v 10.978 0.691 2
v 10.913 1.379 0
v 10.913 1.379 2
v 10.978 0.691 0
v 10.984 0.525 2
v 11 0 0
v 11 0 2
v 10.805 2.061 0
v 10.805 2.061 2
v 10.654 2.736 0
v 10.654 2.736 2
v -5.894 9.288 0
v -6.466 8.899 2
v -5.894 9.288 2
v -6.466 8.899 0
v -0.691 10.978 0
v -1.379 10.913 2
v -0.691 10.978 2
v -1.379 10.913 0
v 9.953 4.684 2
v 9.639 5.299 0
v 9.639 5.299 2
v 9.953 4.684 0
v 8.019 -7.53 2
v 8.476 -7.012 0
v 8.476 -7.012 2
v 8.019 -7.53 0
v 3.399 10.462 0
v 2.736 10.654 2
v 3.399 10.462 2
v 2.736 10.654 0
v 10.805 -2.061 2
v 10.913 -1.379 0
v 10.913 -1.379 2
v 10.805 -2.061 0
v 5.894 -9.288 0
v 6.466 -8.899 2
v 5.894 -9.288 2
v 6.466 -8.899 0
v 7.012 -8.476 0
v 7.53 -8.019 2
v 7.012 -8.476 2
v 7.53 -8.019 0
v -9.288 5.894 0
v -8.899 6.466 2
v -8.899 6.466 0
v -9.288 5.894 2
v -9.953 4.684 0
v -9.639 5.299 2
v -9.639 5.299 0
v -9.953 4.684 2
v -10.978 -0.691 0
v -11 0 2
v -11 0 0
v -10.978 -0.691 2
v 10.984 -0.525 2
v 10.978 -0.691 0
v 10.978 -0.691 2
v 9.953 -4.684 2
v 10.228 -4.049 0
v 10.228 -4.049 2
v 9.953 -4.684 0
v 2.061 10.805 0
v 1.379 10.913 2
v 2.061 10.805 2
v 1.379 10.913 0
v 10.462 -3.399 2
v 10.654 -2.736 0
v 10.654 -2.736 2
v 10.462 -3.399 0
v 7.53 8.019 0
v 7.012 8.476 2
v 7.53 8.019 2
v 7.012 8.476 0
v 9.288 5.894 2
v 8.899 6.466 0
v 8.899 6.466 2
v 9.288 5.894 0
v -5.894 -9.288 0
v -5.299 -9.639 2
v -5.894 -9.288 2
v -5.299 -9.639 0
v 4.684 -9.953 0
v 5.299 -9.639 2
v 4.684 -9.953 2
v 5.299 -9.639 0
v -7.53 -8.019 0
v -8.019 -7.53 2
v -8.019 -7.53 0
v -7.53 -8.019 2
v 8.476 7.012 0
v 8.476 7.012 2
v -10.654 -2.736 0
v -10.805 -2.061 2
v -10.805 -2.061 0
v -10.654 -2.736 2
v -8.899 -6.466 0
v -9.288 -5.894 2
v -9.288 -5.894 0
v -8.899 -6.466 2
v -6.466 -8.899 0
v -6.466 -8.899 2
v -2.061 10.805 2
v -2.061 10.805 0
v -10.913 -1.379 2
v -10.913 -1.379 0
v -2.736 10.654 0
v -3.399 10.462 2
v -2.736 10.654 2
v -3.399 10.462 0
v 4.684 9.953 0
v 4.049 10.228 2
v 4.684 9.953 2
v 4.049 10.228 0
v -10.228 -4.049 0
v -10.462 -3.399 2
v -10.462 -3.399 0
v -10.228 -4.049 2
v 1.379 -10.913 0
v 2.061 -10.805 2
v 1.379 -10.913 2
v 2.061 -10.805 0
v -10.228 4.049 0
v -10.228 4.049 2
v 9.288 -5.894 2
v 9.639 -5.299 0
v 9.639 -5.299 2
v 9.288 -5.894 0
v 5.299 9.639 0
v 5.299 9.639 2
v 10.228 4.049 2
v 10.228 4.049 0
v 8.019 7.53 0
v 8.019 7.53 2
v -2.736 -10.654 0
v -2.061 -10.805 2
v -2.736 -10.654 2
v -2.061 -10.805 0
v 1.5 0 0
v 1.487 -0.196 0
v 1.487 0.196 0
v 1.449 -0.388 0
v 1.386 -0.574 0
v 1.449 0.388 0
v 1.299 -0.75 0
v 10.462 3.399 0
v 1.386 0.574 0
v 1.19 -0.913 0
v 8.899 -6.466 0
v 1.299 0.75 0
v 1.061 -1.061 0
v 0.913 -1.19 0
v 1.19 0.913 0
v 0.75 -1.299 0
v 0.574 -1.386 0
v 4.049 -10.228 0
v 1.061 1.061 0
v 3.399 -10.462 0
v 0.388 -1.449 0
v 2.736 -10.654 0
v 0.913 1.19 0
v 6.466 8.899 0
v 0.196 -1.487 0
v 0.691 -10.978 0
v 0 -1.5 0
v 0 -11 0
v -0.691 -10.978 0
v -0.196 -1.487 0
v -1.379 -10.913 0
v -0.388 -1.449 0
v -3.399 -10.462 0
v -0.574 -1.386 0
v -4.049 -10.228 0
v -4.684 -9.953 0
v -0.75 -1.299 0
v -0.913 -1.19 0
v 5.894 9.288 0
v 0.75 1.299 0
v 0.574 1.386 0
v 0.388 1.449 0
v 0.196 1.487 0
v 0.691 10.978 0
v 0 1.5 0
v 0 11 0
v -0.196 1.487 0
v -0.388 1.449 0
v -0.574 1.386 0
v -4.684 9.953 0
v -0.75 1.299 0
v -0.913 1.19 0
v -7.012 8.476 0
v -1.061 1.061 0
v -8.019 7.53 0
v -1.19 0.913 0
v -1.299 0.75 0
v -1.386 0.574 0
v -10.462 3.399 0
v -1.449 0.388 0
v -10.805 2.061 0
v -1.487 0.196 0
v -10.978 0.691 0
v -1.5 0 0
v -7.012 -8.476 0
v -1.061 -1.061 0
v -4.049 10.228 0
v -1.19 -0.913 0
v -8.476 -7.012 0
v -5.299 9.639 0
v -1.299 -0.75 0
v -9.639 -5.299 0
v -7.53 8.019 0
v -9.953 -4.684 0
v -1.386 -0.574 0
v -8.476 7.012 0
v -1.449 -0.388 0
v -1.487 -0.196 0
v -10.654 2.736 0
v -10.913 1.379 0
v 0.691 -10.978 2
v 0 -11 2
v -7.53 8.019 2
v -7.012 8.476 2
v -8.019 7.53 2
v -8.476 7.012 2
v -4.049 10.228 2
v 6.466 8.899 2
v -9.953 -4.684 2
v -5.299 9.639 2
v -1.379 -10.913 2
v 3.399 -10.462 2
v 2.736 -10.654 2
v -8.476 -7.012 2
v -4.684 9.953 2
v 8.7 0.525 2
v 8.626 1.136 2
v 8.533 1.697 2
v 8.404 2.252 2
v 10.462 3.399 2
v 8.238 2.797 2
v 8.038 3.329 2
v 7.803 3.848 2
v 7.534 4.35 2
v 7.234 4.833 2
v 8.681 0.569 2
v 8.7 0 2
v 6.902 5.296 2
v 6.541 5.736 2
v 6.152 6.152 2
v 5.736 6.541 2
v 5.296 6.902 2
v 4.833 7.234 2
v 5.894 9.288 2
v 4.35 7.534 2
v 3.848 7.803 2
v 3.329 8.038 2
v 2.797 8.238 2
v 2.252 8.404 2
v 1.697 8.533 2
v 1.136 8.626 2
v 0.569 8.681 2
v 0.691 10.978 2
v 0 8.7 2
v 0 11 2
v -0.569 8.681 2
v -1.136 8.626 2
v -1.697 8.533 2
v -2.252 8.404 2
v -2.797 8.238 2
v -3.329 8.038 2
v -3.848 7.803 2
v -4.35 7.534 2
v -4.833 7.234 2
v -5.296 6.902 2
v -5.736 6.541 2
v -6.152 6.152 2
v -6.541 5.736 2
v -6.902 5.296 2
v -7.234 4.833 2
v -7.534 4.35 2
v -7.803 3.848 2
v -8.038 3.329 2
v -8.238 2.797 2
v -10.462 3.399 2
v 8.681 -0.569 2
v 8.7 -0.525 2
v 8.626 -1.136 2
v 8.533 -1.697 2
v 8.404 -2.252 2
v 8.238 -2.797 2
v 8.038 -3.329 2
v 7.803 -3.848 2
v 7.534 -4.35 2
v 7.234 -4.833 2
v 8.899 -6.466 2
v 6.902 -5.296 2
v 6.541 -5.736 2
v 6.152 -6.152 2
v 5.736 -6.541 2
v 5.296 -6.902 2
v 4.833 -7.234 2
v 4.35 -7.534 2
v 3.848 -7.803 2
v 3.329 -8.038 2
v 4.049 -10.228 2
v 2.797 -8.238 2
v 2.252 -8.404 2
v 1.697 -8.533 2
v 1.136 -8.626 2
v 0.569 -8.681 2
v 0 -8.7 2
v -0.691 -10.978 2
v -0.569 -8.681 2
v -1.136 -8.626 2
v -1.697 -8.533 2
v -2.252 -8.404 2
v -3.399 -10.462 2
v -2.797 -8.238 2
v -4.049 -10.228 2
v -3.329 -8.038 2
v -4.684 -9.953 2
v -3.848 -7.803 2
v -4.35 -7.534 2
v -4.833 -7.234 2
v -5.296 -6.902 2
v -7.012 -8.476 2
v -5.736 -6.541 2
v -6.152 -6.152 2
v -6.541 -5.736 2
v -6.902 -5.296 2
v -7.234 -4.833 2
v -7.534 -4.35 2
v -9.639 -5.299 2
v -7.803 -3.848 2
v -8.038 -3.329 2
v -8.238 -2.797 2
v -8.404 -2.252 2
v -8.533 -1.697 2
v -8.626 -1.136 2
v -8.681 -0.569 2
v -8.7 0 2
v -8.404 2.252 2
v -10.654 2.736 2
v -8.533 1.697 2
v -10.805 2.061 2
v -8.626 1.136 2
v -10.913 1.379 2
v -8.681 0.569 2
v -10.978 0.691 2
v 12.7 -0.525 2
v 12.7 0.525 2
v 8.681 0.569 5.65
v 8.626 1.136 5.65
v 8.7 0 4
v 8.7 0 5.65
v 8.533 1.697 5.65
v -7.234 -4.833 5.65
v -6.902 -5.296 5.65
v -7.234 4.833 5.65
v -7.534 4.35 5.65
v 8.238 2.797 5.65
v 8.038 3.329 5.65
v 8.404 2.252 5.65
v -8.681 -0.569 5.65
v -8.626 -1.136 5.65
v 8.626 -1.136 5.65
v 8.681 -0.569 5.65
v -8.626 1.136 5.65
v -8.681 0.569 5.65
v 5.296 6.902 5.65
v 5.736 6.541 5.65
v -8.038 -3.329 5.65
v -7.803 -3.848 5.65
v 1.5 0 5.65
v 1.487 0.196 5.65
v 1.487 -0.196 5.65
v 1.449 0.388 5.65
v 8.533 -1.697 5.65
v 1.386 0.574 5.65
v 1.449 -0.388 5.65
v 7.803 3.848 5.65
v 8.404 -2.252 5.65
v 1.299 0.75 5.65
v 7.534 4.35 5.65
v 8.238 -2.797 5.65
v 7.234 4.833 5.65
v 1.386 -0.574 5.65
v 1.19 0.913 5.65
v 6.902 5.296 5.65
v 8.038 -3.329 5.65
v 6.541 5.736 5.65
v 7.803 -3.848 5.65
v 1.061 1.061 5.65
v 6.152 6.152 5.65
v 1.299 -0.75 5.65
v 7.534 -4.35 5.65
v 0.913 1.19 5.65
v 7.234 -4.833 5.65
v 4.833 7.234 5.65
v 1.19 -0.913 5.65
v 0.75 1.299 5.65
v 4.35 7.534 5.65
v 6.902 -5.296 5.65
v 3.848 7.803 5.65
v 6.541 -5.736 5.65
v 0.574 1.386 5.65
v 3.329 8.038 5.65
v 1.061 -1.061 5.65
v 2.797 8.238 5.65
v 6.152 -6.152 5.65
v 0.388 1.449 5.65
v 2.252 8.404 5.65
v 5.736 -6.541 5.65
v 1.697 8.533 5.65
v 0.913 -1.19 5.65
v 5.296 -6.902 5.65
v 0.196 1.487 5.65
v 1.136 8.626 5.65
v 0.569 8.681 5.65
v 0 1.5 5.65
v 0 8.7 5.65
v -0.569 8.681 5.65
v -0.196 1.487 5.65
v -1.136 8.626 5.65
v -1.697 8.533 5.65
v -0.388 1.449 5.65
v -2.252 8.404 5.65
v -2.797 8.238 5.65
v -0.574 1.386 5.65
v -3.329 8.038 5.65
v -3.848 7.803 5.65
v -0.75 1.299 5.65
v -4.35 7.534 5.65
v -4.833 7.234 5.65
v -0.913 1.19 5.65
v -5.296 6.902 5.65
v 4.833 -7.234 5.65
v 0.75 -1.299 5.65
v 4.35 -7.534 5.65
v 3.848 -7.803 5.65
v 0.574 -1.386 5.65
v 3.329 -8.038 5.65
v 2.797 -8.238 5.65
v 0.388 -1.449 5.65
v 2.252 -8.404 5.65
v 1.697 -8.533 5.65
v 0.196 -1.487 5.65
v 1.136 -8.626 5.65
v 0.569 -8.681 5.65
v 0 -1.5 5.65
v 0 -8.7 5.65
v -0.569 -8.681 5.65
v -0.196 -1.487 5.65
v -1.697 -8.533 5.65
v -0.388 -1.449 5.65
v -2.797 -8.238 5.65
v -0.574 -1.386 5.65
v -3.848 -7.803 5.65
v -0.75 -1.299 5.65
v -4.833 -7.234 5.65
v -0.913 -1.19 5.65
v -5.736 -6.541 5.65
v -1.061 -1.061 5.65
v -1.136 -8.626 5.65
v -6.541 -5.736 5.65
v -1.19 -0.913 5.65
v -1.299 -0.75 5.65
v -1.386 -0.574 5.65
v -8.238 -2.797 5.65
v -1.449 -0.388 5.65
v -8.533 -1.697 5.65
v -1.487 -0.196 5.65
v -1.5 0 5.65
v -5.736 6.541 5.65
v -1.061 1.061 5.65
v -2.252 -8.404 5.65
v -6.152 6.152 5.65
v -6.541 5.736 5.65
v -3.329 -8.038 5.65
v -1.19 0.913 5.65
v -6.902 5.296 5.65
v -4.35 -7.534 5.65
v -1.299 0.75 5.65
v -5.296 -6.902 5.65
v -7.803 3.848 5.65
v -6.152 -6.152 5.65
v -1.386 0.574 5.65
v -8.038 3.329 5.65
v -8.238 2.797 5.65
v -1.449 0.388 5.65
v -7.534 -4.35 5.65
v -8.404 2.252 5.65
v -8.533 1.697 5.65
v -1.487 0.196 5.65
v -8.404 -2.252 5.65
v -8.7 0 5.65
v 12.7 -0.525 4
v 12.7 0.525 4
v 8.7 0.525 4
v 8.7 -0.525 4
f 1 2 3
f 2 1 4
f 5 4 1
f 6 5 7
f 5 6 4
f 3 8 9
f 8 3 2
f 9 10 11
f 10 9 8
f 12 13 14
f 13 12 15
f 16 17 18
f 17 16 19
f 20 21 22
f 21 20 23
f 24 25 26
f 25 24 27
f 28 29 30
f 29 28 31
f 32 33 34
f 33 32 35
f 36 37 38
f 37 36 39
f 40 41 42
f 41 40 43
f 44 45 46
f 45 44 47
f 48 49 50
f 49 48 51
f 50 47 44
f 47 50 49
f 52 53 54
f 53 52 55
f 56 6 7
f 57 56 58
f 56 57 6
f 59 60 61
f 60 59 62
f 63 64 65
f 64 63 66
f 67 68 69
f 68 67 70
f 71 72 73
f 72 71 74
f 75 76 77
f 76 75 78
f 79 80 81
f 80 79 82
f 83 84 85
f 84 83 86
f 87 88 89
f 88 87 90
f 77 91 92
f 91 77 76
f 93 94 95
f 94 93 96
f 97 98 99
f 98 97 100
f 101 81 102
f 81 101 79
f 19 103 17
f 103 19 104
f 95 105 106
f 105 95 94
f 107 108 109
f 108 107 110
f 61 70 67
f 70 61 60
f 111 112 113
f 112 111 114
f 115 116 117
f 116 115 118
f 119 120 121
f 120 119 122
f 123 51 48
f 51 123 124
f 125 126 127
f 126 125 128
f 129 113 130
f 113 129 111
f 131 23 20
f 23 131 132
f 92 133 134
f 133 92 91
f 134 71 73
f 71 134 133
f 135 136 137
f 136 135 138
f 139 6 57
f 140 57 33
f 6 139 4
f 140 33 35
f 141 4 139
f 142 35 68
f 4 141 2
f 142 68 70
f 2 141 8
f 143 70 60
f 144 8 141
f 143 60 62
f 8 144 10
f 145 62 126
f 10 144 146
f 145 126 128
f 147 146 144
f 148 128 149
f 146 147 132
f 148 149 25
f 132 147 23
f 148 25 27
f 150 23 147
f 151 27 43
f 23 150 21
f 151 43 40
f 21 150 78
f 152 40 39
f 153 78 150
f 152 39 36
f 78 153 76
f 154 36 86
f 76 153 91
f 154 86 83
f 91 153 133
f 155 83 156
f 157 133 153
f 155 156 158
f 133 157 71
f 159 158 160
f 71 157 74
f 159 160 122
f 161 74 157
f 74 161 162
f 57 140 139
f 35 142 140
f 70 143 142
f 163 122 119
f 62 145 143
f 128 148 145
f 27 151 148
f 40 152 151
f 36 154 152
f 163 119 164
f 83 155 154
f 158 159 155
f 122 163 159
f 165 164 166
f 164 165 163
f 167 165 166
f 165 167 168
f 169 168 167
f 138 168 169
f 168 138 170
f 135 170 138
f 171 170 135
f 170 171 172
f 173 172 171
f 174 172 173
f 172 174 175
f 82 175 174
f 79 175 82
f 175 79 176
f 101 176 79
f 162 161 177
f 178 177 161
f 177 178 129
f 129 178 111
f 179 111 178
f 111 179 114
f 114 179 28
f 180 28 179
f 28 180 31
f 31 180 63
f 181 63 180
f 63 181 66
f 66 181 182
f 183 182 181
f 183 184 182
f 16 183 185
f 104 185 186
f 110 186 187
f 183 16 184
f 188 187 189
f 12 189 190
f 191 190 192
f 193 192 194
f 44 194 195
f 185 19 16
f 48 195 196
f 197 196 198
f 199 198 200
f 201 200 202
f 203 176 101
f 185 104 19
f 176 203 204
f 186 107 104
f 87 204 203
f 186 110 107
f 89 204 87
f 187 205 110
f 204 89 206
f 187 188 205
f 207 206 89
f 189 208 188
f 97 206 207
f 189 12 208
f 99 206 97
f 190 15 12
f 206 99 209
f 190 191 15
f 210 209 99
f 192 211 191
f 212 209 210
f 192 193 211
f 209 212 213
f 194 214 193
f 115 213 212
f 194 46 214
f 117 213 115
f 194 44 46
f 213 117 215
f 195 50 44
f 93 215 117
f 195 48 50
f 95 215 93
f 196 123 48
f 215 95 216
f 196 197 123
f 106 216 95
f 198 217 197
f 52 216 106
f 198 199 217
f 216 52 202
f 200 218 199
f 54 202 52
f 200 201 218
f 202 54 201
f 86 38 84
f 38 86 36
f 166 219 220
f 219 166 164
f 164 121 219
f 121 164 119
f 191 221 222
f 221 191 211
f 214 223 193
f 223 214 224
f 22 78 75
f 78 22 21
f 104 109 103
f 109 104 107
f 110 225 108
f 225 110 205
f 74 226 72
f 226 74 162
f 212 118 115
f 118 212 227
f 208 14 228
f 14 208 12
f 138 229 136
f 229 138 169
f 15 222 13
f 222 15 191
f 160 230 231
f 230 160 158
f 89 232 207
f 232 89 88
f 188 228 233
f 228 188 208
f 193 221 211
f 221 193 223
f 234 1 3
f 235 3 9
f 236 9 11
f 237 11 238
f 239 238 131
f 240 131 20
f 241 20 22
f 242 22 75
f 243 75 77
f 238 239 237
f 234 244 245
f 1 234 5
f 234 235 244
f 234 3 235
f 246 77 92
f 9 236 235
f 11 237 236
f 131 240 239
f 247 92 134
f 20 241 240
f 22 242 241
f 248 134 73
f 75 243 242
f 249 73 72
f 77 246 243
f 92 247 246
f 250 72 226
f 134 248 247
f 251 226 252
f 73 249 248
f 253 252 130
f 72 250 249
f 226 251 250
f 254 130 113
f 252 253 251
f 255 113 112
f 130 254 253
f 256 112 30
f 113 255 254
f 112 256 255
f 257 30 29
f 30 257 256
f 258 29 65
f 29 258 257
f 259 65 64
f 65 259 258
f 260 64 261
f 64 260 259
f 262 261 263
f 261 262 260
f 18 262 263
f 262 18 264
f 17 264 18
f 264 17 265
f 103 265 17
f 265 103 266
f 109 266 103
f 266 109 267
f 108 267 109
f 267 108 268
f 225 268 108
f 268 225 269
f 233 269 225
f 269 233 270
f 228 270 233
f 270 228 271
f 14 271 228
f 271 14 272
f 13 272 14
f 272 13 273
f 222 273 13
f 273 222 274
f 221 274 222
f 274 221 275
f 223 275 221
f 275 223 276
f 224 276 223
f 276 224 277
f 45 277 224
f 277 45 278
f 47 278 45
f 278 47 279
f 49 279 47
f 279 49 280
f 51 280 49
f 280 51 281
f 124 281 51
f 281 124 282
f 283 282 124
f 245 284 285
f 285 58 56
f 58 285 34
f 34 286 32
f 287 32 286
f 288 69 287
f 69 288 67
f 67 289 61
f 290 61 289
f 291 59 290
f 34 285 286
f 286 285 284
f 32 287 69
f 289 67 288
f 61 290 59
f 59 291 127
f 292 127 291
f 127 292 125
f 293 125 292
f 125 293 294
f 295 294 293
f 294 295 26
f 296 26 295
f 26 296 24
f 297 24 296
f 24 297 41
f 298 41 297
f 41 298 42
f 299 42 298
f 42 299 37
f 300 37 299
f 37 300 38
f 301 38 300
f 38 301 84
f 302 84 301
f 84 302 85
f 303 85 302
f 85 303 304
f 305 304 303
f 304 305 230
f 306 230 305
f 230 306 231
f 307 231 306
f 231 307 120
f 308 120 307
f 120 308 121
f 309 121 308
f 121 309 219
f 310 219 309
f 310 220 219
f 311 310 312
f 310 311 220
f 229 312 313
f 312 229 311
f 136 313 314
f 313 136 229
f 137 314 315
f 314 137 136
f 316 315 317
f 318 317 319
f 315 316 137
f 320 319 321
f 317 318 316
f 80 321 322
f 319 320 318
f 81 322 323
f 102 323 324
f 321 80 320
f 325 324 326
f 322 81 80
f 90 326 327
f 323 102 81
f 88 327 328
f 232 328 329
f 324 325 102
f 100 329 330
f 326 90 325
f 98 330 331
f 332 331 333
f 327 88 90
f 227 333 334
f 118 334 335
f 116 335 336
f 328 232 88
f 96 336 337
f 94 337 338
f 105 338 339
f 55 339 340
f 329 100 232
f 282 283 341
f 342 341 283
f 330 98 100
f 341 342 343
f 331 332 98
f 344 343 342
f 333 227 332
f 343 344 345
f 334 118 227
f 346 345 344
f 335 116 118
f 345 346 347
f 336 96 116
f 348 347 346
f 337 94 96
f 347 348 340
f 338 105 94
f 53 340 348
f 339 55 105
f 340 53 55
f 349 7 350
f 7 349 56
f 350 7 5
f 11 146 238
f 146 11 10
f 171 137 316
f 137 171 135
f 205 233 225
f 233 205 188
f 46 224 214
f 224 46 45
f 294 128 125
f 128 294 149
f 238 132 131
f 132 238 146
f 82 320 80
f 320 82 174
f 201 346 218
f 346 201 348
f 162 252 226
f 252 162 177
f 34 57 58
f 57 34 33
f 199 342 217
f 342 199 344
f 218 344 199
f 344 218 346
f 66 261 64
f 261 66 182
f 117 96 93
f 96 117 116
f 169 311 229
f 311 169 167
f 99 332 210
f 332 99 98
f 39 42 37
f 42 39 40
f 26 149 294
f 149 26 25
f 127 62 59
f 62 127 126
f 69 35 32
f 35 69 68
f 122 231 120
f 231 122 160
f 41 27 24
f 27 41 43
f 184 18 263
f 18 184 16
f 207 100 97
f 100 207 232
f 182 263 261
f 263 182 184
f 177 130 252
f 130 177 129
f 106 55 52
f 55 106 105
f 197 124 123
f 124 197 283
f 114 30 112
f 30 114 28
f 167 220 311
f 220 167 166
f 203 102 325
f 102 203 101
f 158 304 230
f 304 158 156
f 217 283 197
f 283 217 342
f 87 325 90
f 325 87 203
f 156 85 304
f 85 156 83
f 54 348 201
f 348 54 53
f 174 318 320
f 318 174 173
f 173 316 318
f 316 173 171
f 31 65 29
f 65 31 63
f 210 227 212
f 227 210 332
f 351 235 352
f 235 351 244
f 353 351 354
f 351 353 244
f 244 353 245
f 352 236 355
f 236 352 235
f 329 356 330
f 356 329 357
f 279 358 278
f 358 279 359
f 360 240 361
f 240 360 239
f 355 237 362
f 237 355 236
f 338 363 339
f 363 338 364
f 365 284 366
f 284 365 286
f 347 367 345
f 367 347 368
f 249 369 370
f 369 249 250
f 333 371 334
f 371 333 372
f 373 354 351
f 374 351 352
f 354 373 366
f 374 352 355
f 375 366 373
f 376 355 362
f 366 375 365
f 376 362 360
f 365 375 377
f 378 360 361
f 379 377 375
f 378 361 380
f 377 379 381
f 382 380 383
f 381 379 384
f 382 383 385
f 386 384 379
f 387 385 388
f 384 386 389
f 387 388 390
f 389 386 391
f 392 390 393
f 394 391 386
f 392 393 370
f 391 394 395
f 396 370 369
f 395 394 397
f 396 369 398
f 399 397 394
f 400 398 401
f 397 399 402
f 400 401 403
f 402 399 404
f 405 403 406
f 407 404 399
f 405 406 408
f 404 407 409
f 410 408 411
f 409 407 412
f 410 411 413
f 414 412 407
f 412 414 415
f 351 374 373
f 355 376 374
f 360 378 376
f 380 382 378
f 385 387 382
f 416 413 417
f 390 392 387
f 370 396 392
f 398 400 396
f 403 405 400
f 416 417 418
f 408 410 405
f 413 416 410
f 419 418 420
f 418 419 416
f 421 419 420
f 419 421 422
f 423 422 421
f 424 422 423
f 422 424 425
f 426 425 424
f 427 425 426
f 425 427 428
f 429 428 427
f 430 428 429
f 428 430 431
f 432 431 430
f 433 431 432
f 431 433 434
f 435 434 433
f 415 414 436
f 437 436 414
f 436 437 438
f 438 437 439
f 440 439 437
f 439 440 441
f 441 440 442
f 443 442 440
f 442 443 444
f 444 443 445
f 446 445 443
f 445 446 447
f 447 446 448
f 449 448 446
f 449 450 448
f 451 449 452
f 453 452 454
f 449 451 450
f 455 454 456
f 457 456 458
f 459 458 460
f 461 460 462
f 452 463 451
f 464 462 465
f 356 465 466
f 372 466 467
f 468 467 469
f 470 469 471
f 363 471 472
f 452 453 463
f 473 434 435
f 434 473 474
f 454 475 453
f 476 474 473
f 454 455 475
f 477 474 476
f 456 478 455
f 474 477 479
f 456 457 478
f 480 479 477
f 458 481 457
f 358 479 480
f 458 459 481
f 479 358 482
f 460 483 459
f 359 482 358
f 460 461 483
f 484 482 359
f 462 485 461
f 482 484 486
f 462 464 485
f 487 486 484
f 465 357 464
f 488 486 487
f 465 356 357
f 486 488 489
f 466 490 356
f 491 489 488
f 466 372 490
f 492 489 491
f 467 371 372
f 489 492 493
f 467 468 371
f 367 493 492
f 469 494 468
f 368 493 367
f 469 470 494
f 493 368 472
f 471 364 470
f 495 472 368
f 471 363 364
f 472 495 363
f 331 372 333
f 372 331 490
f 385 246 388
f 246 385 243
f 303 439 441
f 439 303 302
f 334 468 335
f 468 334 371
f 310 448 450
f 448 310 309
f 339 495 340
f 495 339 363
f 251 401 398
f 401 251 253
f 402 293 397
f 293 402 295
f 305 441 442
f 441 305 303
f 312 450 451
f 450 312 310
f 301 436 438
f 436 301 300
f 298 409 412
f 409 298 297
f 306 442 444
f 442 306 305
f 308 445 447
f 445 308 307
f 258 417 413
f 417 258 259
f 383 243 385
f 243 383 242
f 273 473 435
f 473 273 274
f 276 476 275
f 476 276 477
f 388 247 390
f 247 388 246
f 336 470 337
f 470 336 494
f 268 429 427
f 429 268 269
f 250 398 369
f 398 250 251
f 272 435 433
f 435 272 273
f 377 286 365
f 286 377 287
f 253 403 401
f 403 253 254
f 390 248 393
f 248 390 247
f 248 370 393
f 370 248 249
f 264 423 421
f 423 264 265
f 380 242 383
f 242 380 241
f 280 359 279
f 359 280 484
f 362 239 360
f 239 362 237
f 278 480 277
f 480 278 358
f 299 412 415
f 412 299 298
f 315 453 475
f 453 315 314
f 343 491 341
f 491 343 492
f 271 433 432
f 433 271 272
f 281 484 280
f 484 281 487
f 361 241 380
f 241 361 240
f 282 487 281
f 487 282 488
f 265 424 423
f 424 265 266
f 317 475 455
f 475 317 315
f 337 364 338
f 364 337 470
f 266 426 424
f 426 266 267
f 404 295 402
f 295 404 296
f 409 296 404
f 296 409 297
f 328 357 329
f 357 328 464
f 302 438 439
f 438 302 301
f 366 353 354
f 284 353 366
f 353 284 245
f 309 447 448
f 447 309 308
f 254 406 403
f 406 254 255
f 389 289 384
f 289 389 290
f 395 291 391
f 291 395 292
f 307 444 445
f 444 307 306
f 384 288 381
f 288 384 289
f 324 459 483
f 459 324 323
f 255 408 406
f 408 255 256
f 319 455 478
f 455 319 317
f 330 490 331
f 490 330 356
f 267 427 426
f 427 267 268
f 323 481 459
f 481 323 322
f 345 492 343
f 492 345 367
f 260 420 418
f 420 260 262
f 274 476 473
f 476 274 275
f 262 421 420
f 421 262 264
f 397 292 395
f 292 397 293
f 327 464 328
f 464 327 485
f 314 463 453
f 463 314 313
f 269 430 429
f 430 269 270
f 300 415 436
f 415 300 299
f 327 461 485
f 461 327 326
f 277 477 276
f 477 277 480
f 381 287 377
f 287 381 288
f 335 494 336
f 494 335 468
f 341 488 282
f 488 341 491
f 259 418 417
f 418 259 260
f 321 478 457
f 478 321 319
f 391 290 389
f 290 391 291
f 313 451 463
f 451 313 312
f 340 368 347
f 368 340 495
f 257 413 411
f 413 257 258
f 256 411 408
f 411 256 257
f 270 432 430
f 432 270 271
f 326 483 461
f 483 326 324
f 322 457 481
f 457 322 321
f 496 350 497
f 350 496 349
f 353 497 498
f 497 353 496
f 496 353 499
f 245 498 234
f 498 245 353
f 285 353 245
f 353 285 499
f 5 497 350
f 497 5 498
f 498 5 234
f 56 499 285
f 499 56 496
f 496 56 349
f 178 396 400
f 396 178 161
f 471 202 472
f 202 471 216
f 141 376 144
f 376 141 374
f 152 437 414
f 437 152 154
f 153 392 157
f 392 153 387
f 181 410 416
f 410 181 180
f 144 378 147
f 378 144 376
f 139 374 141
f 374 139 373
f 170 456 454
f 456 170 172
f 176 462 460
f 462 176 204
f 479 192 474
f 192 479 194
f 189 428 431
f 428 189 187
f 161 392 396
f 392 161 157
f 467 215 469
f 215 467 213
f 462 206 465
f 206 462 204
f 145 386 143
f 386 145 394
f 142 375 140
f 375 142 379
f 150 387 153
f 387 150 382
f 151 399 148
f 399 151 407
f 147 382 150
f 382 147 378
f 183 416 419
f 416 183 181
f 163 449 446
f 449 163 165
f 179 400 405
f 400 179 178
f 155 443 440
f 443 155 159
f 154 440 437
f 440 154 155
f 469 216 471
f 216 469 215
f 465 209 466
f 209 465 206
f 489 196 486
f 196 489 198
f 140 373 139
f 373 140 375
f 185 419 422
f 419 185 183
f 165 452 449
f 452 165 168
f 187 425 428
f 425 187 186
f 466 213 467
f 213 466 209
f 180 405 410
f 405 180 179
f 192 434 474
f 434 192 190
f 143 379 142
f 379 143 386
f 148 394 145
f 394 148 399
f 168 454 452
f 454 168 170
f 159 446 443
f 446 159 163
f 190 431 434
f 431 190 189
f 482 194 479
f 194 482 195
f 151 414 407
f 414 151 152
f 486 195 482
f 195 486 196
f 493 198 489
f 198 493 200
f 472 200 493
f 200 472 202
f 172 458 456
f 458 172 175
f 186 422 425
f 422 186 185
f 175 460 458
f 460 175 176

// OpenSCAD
// part_id: mar10
// name: Mars center disc
// source_drawing_ids: DRW-013
// units: mm
// revision: 0.1
// SPDX-License-Identifier: MIT

module part_mar10(
    outer_d = 22.0,
    mid_d = 17.4,
    bore_d = 3.0,
    total_h = 6.7,
    base_h = 2.0,
    top_h = 3.65,
    tab_w = 1.05,
    tab_l = 4.0,
    tab_h = 2.0
) {
    difference() {
        union() {
            cylinder(d = outer_d, h = base_h, center = false, $fn = 100);
            translate([0, 0, base_h]) cylinder(d = mid_d, h = top_h, center = false, $fn = 96);
            translate([mid_d / 2, -tab_w / 2, base_h]) cube([tab_l, tab_w, tab_h], center = false);
        }
        translate([0, 0, -0.05]) cylinder(d = bore_d, h = total_h + 0.1, center = false, $fn = 48);
    }
}

// ---- "main guard" ----
if (is_undef(__LIB_MODE__)) {
    part_mar10();
}
